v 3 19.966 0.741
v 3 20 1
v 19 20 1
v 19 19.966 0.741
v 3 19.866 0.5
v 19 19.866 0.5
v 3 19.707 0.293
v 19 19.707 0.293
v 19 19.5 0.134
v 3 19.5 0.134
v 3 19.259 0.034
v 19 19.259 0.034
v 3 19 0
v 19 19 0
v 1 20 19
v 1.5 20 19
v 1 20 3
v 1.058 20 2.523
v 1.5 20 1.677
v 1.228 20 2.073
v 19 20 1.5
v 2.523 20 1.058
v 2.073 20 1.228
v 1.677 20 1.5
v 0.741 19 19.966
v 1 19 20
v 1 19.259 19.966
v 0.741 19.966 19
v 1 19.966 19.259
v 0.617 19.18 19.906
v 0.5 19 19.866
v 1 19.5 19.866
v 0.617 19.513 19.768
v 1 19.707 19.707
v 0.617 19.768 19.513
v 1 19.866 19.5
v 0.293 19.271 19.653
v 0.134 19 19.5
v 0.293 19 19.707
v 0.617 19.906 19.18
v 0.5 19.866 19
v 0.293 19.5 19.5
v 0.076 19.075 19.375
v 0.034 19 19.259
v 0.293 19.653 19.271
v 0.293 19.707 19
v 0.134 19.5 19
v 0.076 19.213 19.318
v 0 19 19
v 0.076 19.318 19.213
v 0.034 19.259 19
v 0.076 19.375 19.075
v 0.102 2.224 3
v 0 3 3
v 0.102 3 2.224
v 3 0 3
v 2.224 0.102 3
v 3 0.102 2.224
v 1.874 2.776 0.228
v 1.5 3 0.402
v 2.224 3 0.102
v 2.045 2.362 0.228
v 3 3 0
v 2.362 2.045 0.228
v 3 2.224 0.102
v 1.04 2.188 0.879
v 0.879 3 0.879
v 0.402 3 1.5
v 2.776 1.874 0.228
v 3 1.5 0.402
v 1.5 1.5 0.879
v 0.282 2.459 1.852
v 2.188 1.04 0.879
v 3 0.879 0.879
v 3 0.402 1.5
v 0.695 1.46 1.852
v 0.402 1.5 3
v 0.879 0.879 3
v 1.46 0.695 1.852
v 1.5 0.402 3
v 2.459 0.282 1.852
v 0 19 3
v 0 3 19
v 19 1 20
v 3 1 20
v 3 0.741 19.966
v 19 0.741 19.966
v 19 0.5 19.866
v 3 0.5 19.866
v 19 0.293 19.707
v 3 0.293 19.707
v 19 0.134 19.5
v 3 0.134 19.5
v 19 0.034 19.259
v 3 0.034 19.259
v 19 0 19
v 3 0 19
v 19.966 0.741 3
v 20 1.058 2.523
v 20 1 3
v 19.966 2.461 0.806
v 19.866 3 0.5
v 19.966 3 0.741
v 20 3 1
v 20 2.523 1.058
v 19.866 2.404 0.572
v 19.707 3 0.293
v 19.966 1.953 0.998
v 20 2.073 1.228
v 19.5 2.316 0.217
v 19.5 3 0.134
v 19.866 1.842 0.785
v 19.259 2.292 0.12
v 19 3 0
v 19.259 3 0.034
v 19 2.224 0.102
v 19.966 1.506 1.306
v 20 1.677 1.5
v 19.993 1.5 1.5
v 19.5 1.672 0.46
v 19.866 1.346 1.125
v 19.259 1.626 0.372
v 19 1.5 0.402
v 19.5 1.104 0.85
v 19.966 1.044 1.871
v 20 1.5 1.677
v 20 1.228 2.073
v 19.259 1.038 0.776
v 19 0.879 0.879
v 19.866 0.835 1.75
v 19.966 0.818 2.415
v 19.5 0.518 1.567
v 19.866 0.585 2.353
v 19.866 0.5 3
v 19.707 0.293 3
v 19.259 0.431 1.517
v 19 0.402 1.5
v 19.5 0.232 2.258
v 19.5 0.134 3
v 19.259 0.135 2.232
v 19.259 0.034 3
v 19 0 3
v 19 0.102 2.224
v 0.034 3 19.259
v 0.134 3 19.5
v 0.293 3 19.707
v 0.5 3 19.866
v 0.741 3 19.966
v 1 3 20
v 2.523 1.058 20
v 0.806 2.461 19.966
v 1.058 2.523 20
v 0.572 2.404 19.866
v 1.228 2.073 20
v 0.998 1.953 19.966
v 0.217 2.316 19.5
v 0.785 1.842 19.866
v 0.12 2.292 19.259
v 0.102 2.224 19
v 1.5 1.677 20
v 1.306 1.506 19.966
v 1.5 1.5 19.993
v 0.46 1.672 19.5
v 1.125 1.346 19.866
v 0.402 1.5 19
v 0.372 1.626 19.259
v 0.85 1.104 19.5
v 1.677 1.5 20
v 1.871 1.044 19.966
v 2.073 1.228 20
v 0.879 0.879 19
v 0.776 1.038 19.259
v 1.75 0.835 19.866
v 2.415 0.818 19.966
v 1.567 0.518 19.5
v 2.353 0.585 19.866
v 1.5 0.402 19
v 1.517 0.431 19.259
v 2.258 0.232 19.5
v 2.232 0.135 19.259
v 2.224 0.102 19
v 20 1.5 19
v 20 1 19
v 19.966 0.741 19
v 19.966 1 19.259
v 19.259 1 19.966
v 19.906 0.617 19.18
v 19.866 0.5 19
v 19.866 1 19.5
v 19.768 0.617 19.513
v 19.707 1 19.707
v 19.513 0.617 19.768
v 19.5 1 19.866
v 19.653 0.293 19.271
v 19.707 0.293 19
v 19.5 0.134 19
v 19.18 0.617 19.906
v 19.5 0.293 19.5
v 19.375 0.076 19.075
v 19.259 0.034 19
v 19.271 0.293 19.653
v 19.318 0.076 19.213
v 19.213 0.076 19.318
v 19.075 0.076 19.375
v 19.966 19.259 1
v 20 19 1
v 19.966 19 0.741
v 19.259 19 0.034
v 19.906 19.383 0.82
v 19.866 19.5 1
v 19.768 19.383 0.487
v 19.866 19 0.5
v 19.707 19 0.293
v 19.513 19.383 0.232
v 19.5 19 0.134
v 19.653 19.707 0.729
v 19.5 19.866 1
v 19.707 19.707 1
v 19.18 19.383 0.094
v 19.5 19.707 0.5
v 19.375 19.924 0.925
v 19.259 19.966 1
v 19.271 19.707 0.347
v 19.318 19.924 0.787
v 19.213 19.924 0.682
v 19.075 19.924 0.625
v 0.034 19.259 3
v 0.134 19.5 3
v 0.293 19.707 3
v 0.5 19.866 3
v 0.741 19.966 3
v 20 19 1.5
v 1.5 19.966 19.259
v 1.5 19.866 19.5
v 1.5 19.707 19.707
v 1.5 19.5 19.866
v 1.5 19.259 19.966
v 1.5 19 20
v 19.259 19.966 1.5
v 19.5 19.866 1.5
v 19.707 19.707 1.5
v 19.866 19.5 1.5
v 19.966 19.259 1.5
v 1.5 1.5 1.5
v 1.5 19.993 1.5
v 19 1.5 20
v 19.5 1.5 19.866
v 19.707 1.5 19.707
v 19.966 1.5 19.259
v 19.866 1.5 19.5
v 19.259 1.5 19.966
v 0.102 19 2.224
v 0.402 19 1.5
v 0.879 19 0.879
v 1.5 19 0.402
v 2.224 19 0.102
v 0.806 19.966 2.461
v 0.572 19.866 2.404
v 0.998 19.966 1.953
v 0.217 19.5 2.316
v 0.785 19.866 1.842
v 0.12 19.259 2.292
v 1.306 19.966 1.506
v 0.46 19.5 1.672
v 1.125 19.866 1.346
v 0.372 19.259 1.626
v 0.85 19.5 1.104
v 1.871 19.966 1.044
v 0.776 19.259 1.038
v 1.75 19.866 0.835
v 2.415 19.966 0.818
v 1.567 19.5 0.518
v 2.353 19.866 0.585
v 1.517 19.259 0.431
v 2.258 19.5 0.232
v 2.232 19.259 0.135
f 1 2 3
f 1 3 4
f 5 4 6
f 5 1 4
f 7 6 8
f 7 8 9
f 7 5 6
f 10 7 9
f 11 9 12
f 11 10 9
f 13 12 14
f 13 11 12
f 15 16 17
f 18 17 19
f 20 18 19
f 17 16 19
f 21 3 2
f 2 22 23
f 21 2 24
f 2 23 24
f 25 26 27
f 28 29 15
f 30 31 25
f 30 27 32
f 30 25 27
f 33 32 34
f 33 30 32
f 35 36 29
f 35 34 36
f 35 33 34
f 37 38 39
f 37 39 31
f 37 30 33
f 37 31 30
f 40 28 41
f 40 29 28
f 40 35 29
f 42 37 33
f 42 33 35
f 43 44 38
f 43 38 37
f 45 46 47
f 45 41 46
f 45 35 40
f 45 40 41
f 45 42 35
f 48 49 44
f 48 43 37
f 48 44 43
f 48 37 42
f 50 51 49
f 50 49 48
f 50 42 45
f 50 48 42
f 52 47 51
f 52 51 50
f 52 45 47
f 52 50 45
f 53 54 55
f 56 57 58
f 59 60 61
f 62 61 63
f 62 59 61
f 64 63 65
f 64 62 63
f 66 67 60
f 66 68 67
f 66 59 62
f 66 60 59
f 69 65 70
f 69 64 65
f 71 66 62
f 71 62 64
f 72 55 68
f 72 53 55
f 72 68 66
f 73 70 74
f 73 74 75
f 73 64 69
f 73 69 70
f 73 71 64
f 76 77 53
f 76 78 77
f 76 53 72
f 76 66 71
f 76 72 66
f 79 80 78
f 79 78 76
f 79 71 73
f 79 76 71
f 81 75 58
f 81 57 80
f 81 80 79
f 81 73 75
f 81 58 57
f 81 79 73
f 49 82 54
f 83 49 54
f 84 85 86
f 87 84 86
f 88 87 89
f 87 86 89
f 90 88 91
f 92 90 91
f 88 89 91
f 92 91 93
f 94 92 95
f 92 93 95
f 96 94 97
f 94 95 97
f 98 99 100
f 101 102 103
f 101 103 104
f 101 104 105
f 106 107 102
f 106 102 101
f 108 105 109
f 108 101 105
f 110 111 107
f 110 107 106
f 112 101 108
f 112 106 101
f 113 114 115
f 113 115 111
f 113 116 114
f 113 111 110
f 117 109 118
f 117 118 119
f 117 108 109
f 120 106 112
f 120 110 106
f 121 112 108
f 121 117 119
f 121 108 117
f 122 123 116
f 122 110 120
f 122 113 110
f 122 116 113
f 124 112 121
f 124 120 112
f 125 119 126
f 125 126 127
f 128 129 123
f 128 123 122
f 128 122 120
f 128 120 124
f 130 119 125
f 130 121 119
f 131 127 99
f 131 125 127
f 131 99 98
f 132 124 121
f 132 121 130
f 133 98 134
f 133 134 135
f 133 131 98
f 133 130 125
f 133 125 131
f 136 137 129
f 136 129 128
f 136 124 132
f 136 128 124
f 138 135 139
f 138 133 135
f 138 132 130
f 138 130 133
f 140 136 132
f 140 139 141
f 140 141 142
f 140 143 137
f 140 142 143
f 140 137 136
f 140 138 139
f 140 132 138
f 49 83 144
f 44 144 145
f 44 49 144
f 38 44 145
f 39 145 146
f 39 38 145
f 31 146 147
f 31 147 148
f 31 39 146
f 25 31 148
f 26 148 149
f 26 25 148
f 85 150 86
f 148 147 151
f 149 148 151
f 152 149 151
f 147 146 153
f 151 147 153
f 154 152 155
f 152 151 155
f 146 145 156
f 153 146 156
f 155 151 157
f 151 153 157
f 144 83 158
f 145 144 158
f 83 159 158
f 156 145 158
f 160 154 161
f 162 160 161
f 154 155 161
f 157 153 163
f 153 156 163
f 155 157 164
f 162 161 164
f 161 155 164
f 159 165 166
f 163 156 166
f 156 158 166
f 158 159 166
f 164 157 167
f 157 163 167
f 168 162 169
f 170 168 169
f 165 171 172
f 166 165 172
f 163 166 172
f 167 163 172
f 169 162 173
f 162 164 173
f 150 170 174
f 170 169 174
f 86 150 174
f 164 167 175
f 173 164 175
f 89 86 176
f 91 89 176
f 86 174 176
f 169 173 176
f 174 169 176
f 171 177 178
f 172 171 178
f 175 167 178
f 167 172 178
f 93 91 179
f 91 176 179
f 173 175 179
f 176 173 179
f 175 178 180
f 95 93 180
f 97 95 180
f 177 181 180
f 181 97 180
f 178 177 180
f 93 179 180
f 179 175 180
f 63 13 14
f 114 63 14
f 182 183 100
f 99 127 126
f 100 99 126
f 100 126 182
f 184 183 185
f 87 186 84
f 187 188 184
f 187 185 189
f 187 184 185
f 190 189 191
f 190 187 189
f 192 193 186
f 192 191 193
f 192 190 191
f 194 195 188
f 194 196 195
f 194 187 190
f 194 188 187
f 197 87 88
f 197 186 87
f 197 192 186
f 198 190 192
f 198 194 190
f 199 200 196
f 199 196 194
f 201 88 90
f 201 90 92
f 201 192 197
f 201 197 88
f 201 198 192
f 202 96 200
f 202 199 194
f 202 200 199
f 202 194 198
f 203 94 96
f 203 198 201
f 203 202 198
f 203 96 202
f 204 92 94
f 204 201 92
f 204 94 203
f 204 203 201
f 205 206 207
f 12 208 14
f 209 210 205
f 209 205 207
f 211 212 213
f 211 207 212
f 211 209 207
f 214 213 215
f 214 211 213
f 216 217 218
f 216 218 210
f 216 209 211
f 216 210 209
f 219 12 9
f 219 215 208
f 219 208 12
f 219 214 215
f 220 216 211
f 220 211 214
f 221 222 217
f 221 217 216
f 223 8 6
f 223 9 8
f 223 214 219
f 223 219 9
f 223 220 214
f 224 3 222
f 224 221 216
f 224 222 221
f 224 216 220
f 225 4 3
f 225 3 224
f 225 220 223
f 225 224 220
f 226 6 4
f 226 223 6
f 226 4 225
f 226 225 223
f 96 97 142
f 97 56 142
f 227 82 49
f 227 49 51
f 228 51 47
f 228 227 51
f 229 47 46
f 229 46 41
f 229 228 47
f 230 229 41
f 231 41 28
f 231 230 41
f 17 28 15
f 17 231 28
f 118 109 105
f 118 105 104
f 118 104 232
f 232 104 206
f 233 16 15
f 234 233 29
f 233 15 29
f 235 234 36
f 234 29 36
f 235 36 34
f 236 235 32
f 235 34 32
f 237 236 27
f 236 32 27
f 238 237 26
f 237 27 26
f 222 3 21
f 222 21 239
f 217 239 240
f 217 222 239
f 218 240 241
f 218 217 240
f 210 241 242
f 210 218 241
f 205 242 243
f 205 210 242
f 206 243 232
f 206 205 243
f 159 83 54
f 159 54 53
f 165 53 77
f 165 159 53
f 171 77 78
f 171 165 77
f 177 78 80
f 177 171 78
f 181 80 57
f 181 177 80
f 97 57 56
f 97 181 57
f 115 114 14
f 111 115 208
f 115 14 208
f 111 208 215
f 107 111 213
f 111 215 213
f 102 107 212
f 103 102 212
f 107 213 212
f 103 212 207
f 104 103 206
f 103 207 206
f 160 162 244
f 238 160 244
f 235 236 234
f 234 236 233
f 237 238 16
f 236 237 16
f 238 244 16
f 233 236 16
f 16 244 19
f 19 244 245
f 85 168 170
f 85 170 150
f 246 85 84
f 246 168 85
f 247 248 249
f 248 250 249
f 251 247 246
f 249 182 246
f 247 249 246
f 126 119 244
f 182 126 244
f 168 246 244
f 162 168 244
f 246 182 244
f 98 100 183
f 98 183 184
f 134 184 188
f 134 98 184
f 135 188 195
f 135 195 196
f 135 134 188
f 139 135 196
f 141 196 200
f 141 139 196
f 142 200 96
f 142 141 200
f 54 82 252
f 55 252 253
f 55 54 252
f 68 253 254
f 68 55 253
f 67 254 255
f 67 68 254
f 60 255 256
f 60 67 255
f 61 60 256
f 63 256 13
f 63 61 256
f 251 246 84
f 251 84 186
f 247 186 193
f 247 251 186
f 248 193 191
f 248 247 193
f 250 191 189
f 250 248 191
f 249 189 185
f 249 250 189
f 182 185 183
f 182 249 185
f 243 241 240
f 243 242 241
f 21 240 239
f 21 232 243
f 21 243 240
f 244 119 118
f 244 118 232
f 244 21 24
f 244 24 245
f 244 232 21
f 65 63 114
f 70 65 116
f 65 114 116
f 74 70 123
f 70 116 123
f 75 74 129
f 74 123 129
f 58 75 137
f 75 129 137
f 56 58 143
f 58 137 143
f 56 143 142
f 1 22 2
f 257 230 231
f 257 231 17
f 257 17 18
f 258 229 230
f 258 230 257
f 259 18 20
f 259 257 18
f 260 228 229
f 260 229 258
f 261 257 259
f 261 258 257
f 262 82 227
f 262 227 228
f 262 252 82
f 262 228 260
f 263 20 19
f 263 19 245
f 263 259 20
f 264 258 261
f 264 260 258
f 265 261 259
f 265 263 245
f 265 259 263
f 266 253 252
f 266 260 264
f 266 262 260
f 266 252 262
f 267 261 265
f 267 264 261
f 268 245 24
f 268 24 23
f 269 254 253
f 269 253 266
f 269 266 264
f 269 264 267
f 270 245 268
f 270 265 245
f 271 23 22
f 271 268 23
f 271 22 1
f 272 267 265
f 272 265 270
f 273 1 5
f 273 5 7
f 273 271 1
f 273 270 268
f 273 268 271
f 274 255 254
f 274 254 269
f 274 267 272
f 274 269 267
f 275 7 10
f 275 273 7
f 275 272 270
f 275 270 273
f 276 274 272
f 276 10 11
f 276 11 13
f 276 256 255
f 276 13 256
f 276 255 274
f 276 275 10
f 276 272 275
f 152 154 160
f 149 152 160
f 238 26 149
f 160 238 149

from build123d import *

# Parameters (mm, degrees)
F1_DEPTH     = 20
F3_DEPTH     = 20
F4_R         = 3
F5_T1_DEPTH  = 16
F5_T3_DEPTH  = 16
F5_T5_DEPTH  = 3
F5_T7_DEPTH  = 3
F5_T9_DEPTH  = 3
F5_T11_DEPTH = 16
F5_S15_W     = 1
F5_S15_H     = 1
F5_T16_DEPTH = 1
F5_S21_W     = 1
F5_S21_H     = 1
F5_T22_DEPTH = 1
F5_S27_W     = 1
F5_S27_H     = 1
F5_T28_DEPTH = 1
F5_T32_ANGLE = 90
F5_T34_ANGLE = 90
F5_T36_ANGLE = 90


# Not quite as in the source:
# - a fillet or chamfer that OpenCascade refuses, or shapes differently, is made with other operations: its cross-section is extruded or revolved along the edge and cut away or added


with BuildPart() as f1:
    # F0 (on Top) → F1 (new body)
    with BuildSketch(Plane.XY):
        Polygon((0, 20), (0, 0), (20, 0), (20, 1.5), (1.5, 1.5), (1.5, 20), align=None)
    extrude(amount=F1_DEPTH)

    # F2 (on Front) → F3 (join)
    with BuildSketch(Plane.XZ):
        Polygon((0, 20), (0, 0), (20, 0), (20, 1.5), (1.5, 1.5), (1.5, 20), align=None)
    extrude(amount=-F3_DEPTH)

    # F4
    f4_edges = [f1.edges().sort_by_distance(p)[0] for p in [
        (0, 0, 10),
        (0, 10, 0),
        (10, 0, 0),
    ]]
    fillet(f4_edges, radius=F4_R)

    # F5: fillet of radius 1 on 12 edges, made by hand

    # F5_s2 → F5_t1 (cut)
    with BuildSketch(Plane.XZ.offset(-19)):
        with BuildLine():
            ThreePointArc((0, 19), (0.2928932188, 19.7071067812), (1, 20))
            Line((1, 20), (0, 20))
            Line((0, 20), (0, 19))
        make_face()
        with BuildLine():
            ThreePointArc((19, 0), (19.7071067812, 0.2928932188), (20, 1))
            Line((20, 1), (20, 0))
            Line((20, 0), (19, 0))
        make_face()
    extrude(amount=F5_T1_DEPTH, mode=Mode.SUBTRACT)

    # F5_s4 → F5_t3 (cut)
    with BuildSketch(Plane.YZ.offset(3)):
        with BuildLine():
            ThreePointArc((20, 1), (19.7071067812, 0.2928932188), (19, 0))
            Line((19, 0), (20, 0))
            Line((20, 0), (20, 1))
        make_face()
        with BuildLine():
            ThreePointArc((1, 20), (0.2928932188, 19.7071067812), (0, 19))
            Line((0, 19), (0, 20))
            Line((0, 20), (1, 20))
        make_face()
    extrude(amount=F5_T3_DEPTH, mode=Mode.SUBTRACT)

    # F5_s6 → F5_t5 (cut)
    with BuildSketch(Plane.YZ.offset(1)):
        with BuildLine():
            ThreePointArc((20, 19), (19.7071067812, 19.7071067812), (19, 20))
            Line((19, 20), (20, 20))
            Line((20, 20), (20, 19))
        make_face()
    extrude(amount=F5_T5_DEPTH, mode=Mode.SUBTRACT)

    # F5_s8 → F5_t7 (cut)
    with BuildSketch(Plane.XY.offset(1)):
        with BuildLine():
            ThreePointArc((19, 20), (19.7071067812, 19.7071067812), (20, 19))
            Line((20, 19), (20, 20))
            Line((20, 20), (19, 20))
        make_face()
    extrude(amount=F5_T7_DEPTH, mode=Mode.SUBTRACT)

    # F5_s10 → F5_t9 (cut)
    with BuildSketch(Plane.XZ.offset(-4)):
        with BuildLine():
            ThreePointArc((19, 20), (19.7071067812, 19.7071067812), (20, 19))
            Line((20, 19), (20, 20))
            Line((20, 20), (19, 20))
        make_face()
    extrude(amount=F5_T9_DEPTH, mode=Mode.SUBTRACT)

    # F5_s12 → F5_t11 (cut)
    with BuildSketch(Plane.XY.offset(3)):
        with BuildLine():
            ThreePointArc((0, 19), (0.2928932188, 19.7071067812), (1, 20))
            Line((1, 20), (0, 20))
            Line((0, 20), (0, 19))
        make_face()
        with BuildLine():
            ThreePointArc((20, 1), (19.7071067812, 0.2928932188), (19, 0))
            Line((19, 0), (20, 0))
            Line((20, 0), (20, 1))
        make_face()
    extrude(amount=F5_T11_DEPTH, mode=Mode.SUBTRACT)


with BuildPart() as f5_tool14:
    # F5_s15 → F5_t16 (new body)
    with BuildSketch(Plane.YZ.offset(1)):
        with Locations((19.5, 19.5)):
            Rectangle(F5_S15_W, F5_S15_H)
    extrude(amount=-F5_T16_DEPTH)

    # F5_s17 → F5_t18 (revolve, cut)
    with BuildSketch(Plane(origin=(1, 19, 19), x_dir=(0, -0.7071067812, -0.7071067812), z_dir=(0, 0.7071067812, -0.7071067812))):
        with BuildLine():
            ThreePointArc((0, -1), (1, 0), (0, 1))
            Line((0, 1), (0, -1))
        make_face()
    revolve(axis=Axis((1, 19, 19), (-1, 0, 0)), mode=Mode.SUBTRACT)


with BuildPart() as f1_1:
    add(f1.part)

    # F5_t13: cut F5_tool14
    add(f5_tool14.part, mode=Mode.SUBTRACT)


with BuildPart() as f5_tool20:
    # F5_s21 → F5_t22 (new body)
    with BuildSketch(Plane.XZ.offset(-19)):
        with Locations((19.5, 0.5)):
            Rectangle(F5_S21_W, F5_S21_H)
    extrude(amount=-F5_T22_DEPTH)

    # F5_s23 → F5_t24 (revolve, cut)
    with BuildSketch(Plane(origin=(19, 19, 1), x_dir=(-0.7071067812, 0, 0.7071067812), z_dir=(-0.7071067812, 0, -0.7071067812))):
        with BuildLine():
            ThreePointArc((0, -1), (1, 0), (0, 1))
            Line((0, 1), (0, -1))
        make_face()
    revolve(axis=Axis((19, 19, 1), (0, 1, 0)), mode=Mode.SUBTRACT)


with BuildPart() as f1_2:
    add(f1_1.part)

    # F5_t19: cut F5_tool20
    add(f5_tool20.part, mode=Mode.SUBTRACT)


with BuildPart() as f5_tool26:
    # F5_s27 → F5_t28 (new body)
    with BuildSketch(Plane.XZ.offset(-1)):
        with Locations((19.5, 19.5)):
            Rectangle(F5_S27_W, F5_S27_H)
    extrude(amount=F5_T28_DEPTH)

    # F5_s29 → F5_t30 (revolve, cut)
    with BuildSketch(Plane(origin=(19, 1, 19), x_dir=(-0.7071067812, 0, -0.7071067812), z_dir=(-0.7071067812, 0, 0.7071067812))):
        with BuildLine():
            ThreePointArc((0, -1), (1, 0), (0, 1))
            Line((0, 1), (0, -1))
        make_face()
    revolve(axis=Axis((19, 1, 19), (0, -1, 0)), mode=Mode.SUBTRACT)


with BuildPart() as f1_3:
    add(f1_2.part)

    # F5_t25: cut F5_tool26
    add(f5_tool26.part, mode=Mode.SUBTRACT)

    # F5_s31 → F5_t32 (revolve, cut)
    with BuildSketch(Plane.XY.offset(3)):
        with BuildLine():
            ThreePointArc((1, 20), (0.2928932188, 19.7071067812), (0, 19))
            Line((0, 19), (0, 20))
            Line((0, 20), (1, 20))
        make_face()
    revolve(axis=Axis((3, 20, 3), (0, -1, 0)), revolution_arc=F5_T32_ANGLE, mode=Mode.SUBTRACT)

    # F5_s33 → F5_t34 (revolve, cut)
    with BuildSketch(Plane.XZ.offset(-3)):
        with BuildLine():
            ThreePointArc((1, 20), (0.2928932188, 19.7071067812), (0, 19))
            Line((0, 19), (0, 20))
            Line((0, 20), (1, 20))
        make_face()
    revolve(axis=Axis((3, 3, 20), (0, 0, 1)), revolution_arc=F5_T34_ANGLE, mode=Mode.SUBTRACT)

    # F5_s35 → F5_t36 (revolve, cut)
    with BuildSketch(Plane.XZ.offset(-3)):
        with BuildLine():
            ThreePointArc((20, 1), (19.7071067812, 0.2928932188), (19, 0))
            Line((19, 0), (20, 0))
            Line((20, 0), (20, 1))
        make_face()
    revolve(axis=Axis((20, 3, 3), (-1, 0, 0)), revolution_arc=F5_T36_ANGLE, mode=Mode.SUBTRACT)


solid = f1_3.part
